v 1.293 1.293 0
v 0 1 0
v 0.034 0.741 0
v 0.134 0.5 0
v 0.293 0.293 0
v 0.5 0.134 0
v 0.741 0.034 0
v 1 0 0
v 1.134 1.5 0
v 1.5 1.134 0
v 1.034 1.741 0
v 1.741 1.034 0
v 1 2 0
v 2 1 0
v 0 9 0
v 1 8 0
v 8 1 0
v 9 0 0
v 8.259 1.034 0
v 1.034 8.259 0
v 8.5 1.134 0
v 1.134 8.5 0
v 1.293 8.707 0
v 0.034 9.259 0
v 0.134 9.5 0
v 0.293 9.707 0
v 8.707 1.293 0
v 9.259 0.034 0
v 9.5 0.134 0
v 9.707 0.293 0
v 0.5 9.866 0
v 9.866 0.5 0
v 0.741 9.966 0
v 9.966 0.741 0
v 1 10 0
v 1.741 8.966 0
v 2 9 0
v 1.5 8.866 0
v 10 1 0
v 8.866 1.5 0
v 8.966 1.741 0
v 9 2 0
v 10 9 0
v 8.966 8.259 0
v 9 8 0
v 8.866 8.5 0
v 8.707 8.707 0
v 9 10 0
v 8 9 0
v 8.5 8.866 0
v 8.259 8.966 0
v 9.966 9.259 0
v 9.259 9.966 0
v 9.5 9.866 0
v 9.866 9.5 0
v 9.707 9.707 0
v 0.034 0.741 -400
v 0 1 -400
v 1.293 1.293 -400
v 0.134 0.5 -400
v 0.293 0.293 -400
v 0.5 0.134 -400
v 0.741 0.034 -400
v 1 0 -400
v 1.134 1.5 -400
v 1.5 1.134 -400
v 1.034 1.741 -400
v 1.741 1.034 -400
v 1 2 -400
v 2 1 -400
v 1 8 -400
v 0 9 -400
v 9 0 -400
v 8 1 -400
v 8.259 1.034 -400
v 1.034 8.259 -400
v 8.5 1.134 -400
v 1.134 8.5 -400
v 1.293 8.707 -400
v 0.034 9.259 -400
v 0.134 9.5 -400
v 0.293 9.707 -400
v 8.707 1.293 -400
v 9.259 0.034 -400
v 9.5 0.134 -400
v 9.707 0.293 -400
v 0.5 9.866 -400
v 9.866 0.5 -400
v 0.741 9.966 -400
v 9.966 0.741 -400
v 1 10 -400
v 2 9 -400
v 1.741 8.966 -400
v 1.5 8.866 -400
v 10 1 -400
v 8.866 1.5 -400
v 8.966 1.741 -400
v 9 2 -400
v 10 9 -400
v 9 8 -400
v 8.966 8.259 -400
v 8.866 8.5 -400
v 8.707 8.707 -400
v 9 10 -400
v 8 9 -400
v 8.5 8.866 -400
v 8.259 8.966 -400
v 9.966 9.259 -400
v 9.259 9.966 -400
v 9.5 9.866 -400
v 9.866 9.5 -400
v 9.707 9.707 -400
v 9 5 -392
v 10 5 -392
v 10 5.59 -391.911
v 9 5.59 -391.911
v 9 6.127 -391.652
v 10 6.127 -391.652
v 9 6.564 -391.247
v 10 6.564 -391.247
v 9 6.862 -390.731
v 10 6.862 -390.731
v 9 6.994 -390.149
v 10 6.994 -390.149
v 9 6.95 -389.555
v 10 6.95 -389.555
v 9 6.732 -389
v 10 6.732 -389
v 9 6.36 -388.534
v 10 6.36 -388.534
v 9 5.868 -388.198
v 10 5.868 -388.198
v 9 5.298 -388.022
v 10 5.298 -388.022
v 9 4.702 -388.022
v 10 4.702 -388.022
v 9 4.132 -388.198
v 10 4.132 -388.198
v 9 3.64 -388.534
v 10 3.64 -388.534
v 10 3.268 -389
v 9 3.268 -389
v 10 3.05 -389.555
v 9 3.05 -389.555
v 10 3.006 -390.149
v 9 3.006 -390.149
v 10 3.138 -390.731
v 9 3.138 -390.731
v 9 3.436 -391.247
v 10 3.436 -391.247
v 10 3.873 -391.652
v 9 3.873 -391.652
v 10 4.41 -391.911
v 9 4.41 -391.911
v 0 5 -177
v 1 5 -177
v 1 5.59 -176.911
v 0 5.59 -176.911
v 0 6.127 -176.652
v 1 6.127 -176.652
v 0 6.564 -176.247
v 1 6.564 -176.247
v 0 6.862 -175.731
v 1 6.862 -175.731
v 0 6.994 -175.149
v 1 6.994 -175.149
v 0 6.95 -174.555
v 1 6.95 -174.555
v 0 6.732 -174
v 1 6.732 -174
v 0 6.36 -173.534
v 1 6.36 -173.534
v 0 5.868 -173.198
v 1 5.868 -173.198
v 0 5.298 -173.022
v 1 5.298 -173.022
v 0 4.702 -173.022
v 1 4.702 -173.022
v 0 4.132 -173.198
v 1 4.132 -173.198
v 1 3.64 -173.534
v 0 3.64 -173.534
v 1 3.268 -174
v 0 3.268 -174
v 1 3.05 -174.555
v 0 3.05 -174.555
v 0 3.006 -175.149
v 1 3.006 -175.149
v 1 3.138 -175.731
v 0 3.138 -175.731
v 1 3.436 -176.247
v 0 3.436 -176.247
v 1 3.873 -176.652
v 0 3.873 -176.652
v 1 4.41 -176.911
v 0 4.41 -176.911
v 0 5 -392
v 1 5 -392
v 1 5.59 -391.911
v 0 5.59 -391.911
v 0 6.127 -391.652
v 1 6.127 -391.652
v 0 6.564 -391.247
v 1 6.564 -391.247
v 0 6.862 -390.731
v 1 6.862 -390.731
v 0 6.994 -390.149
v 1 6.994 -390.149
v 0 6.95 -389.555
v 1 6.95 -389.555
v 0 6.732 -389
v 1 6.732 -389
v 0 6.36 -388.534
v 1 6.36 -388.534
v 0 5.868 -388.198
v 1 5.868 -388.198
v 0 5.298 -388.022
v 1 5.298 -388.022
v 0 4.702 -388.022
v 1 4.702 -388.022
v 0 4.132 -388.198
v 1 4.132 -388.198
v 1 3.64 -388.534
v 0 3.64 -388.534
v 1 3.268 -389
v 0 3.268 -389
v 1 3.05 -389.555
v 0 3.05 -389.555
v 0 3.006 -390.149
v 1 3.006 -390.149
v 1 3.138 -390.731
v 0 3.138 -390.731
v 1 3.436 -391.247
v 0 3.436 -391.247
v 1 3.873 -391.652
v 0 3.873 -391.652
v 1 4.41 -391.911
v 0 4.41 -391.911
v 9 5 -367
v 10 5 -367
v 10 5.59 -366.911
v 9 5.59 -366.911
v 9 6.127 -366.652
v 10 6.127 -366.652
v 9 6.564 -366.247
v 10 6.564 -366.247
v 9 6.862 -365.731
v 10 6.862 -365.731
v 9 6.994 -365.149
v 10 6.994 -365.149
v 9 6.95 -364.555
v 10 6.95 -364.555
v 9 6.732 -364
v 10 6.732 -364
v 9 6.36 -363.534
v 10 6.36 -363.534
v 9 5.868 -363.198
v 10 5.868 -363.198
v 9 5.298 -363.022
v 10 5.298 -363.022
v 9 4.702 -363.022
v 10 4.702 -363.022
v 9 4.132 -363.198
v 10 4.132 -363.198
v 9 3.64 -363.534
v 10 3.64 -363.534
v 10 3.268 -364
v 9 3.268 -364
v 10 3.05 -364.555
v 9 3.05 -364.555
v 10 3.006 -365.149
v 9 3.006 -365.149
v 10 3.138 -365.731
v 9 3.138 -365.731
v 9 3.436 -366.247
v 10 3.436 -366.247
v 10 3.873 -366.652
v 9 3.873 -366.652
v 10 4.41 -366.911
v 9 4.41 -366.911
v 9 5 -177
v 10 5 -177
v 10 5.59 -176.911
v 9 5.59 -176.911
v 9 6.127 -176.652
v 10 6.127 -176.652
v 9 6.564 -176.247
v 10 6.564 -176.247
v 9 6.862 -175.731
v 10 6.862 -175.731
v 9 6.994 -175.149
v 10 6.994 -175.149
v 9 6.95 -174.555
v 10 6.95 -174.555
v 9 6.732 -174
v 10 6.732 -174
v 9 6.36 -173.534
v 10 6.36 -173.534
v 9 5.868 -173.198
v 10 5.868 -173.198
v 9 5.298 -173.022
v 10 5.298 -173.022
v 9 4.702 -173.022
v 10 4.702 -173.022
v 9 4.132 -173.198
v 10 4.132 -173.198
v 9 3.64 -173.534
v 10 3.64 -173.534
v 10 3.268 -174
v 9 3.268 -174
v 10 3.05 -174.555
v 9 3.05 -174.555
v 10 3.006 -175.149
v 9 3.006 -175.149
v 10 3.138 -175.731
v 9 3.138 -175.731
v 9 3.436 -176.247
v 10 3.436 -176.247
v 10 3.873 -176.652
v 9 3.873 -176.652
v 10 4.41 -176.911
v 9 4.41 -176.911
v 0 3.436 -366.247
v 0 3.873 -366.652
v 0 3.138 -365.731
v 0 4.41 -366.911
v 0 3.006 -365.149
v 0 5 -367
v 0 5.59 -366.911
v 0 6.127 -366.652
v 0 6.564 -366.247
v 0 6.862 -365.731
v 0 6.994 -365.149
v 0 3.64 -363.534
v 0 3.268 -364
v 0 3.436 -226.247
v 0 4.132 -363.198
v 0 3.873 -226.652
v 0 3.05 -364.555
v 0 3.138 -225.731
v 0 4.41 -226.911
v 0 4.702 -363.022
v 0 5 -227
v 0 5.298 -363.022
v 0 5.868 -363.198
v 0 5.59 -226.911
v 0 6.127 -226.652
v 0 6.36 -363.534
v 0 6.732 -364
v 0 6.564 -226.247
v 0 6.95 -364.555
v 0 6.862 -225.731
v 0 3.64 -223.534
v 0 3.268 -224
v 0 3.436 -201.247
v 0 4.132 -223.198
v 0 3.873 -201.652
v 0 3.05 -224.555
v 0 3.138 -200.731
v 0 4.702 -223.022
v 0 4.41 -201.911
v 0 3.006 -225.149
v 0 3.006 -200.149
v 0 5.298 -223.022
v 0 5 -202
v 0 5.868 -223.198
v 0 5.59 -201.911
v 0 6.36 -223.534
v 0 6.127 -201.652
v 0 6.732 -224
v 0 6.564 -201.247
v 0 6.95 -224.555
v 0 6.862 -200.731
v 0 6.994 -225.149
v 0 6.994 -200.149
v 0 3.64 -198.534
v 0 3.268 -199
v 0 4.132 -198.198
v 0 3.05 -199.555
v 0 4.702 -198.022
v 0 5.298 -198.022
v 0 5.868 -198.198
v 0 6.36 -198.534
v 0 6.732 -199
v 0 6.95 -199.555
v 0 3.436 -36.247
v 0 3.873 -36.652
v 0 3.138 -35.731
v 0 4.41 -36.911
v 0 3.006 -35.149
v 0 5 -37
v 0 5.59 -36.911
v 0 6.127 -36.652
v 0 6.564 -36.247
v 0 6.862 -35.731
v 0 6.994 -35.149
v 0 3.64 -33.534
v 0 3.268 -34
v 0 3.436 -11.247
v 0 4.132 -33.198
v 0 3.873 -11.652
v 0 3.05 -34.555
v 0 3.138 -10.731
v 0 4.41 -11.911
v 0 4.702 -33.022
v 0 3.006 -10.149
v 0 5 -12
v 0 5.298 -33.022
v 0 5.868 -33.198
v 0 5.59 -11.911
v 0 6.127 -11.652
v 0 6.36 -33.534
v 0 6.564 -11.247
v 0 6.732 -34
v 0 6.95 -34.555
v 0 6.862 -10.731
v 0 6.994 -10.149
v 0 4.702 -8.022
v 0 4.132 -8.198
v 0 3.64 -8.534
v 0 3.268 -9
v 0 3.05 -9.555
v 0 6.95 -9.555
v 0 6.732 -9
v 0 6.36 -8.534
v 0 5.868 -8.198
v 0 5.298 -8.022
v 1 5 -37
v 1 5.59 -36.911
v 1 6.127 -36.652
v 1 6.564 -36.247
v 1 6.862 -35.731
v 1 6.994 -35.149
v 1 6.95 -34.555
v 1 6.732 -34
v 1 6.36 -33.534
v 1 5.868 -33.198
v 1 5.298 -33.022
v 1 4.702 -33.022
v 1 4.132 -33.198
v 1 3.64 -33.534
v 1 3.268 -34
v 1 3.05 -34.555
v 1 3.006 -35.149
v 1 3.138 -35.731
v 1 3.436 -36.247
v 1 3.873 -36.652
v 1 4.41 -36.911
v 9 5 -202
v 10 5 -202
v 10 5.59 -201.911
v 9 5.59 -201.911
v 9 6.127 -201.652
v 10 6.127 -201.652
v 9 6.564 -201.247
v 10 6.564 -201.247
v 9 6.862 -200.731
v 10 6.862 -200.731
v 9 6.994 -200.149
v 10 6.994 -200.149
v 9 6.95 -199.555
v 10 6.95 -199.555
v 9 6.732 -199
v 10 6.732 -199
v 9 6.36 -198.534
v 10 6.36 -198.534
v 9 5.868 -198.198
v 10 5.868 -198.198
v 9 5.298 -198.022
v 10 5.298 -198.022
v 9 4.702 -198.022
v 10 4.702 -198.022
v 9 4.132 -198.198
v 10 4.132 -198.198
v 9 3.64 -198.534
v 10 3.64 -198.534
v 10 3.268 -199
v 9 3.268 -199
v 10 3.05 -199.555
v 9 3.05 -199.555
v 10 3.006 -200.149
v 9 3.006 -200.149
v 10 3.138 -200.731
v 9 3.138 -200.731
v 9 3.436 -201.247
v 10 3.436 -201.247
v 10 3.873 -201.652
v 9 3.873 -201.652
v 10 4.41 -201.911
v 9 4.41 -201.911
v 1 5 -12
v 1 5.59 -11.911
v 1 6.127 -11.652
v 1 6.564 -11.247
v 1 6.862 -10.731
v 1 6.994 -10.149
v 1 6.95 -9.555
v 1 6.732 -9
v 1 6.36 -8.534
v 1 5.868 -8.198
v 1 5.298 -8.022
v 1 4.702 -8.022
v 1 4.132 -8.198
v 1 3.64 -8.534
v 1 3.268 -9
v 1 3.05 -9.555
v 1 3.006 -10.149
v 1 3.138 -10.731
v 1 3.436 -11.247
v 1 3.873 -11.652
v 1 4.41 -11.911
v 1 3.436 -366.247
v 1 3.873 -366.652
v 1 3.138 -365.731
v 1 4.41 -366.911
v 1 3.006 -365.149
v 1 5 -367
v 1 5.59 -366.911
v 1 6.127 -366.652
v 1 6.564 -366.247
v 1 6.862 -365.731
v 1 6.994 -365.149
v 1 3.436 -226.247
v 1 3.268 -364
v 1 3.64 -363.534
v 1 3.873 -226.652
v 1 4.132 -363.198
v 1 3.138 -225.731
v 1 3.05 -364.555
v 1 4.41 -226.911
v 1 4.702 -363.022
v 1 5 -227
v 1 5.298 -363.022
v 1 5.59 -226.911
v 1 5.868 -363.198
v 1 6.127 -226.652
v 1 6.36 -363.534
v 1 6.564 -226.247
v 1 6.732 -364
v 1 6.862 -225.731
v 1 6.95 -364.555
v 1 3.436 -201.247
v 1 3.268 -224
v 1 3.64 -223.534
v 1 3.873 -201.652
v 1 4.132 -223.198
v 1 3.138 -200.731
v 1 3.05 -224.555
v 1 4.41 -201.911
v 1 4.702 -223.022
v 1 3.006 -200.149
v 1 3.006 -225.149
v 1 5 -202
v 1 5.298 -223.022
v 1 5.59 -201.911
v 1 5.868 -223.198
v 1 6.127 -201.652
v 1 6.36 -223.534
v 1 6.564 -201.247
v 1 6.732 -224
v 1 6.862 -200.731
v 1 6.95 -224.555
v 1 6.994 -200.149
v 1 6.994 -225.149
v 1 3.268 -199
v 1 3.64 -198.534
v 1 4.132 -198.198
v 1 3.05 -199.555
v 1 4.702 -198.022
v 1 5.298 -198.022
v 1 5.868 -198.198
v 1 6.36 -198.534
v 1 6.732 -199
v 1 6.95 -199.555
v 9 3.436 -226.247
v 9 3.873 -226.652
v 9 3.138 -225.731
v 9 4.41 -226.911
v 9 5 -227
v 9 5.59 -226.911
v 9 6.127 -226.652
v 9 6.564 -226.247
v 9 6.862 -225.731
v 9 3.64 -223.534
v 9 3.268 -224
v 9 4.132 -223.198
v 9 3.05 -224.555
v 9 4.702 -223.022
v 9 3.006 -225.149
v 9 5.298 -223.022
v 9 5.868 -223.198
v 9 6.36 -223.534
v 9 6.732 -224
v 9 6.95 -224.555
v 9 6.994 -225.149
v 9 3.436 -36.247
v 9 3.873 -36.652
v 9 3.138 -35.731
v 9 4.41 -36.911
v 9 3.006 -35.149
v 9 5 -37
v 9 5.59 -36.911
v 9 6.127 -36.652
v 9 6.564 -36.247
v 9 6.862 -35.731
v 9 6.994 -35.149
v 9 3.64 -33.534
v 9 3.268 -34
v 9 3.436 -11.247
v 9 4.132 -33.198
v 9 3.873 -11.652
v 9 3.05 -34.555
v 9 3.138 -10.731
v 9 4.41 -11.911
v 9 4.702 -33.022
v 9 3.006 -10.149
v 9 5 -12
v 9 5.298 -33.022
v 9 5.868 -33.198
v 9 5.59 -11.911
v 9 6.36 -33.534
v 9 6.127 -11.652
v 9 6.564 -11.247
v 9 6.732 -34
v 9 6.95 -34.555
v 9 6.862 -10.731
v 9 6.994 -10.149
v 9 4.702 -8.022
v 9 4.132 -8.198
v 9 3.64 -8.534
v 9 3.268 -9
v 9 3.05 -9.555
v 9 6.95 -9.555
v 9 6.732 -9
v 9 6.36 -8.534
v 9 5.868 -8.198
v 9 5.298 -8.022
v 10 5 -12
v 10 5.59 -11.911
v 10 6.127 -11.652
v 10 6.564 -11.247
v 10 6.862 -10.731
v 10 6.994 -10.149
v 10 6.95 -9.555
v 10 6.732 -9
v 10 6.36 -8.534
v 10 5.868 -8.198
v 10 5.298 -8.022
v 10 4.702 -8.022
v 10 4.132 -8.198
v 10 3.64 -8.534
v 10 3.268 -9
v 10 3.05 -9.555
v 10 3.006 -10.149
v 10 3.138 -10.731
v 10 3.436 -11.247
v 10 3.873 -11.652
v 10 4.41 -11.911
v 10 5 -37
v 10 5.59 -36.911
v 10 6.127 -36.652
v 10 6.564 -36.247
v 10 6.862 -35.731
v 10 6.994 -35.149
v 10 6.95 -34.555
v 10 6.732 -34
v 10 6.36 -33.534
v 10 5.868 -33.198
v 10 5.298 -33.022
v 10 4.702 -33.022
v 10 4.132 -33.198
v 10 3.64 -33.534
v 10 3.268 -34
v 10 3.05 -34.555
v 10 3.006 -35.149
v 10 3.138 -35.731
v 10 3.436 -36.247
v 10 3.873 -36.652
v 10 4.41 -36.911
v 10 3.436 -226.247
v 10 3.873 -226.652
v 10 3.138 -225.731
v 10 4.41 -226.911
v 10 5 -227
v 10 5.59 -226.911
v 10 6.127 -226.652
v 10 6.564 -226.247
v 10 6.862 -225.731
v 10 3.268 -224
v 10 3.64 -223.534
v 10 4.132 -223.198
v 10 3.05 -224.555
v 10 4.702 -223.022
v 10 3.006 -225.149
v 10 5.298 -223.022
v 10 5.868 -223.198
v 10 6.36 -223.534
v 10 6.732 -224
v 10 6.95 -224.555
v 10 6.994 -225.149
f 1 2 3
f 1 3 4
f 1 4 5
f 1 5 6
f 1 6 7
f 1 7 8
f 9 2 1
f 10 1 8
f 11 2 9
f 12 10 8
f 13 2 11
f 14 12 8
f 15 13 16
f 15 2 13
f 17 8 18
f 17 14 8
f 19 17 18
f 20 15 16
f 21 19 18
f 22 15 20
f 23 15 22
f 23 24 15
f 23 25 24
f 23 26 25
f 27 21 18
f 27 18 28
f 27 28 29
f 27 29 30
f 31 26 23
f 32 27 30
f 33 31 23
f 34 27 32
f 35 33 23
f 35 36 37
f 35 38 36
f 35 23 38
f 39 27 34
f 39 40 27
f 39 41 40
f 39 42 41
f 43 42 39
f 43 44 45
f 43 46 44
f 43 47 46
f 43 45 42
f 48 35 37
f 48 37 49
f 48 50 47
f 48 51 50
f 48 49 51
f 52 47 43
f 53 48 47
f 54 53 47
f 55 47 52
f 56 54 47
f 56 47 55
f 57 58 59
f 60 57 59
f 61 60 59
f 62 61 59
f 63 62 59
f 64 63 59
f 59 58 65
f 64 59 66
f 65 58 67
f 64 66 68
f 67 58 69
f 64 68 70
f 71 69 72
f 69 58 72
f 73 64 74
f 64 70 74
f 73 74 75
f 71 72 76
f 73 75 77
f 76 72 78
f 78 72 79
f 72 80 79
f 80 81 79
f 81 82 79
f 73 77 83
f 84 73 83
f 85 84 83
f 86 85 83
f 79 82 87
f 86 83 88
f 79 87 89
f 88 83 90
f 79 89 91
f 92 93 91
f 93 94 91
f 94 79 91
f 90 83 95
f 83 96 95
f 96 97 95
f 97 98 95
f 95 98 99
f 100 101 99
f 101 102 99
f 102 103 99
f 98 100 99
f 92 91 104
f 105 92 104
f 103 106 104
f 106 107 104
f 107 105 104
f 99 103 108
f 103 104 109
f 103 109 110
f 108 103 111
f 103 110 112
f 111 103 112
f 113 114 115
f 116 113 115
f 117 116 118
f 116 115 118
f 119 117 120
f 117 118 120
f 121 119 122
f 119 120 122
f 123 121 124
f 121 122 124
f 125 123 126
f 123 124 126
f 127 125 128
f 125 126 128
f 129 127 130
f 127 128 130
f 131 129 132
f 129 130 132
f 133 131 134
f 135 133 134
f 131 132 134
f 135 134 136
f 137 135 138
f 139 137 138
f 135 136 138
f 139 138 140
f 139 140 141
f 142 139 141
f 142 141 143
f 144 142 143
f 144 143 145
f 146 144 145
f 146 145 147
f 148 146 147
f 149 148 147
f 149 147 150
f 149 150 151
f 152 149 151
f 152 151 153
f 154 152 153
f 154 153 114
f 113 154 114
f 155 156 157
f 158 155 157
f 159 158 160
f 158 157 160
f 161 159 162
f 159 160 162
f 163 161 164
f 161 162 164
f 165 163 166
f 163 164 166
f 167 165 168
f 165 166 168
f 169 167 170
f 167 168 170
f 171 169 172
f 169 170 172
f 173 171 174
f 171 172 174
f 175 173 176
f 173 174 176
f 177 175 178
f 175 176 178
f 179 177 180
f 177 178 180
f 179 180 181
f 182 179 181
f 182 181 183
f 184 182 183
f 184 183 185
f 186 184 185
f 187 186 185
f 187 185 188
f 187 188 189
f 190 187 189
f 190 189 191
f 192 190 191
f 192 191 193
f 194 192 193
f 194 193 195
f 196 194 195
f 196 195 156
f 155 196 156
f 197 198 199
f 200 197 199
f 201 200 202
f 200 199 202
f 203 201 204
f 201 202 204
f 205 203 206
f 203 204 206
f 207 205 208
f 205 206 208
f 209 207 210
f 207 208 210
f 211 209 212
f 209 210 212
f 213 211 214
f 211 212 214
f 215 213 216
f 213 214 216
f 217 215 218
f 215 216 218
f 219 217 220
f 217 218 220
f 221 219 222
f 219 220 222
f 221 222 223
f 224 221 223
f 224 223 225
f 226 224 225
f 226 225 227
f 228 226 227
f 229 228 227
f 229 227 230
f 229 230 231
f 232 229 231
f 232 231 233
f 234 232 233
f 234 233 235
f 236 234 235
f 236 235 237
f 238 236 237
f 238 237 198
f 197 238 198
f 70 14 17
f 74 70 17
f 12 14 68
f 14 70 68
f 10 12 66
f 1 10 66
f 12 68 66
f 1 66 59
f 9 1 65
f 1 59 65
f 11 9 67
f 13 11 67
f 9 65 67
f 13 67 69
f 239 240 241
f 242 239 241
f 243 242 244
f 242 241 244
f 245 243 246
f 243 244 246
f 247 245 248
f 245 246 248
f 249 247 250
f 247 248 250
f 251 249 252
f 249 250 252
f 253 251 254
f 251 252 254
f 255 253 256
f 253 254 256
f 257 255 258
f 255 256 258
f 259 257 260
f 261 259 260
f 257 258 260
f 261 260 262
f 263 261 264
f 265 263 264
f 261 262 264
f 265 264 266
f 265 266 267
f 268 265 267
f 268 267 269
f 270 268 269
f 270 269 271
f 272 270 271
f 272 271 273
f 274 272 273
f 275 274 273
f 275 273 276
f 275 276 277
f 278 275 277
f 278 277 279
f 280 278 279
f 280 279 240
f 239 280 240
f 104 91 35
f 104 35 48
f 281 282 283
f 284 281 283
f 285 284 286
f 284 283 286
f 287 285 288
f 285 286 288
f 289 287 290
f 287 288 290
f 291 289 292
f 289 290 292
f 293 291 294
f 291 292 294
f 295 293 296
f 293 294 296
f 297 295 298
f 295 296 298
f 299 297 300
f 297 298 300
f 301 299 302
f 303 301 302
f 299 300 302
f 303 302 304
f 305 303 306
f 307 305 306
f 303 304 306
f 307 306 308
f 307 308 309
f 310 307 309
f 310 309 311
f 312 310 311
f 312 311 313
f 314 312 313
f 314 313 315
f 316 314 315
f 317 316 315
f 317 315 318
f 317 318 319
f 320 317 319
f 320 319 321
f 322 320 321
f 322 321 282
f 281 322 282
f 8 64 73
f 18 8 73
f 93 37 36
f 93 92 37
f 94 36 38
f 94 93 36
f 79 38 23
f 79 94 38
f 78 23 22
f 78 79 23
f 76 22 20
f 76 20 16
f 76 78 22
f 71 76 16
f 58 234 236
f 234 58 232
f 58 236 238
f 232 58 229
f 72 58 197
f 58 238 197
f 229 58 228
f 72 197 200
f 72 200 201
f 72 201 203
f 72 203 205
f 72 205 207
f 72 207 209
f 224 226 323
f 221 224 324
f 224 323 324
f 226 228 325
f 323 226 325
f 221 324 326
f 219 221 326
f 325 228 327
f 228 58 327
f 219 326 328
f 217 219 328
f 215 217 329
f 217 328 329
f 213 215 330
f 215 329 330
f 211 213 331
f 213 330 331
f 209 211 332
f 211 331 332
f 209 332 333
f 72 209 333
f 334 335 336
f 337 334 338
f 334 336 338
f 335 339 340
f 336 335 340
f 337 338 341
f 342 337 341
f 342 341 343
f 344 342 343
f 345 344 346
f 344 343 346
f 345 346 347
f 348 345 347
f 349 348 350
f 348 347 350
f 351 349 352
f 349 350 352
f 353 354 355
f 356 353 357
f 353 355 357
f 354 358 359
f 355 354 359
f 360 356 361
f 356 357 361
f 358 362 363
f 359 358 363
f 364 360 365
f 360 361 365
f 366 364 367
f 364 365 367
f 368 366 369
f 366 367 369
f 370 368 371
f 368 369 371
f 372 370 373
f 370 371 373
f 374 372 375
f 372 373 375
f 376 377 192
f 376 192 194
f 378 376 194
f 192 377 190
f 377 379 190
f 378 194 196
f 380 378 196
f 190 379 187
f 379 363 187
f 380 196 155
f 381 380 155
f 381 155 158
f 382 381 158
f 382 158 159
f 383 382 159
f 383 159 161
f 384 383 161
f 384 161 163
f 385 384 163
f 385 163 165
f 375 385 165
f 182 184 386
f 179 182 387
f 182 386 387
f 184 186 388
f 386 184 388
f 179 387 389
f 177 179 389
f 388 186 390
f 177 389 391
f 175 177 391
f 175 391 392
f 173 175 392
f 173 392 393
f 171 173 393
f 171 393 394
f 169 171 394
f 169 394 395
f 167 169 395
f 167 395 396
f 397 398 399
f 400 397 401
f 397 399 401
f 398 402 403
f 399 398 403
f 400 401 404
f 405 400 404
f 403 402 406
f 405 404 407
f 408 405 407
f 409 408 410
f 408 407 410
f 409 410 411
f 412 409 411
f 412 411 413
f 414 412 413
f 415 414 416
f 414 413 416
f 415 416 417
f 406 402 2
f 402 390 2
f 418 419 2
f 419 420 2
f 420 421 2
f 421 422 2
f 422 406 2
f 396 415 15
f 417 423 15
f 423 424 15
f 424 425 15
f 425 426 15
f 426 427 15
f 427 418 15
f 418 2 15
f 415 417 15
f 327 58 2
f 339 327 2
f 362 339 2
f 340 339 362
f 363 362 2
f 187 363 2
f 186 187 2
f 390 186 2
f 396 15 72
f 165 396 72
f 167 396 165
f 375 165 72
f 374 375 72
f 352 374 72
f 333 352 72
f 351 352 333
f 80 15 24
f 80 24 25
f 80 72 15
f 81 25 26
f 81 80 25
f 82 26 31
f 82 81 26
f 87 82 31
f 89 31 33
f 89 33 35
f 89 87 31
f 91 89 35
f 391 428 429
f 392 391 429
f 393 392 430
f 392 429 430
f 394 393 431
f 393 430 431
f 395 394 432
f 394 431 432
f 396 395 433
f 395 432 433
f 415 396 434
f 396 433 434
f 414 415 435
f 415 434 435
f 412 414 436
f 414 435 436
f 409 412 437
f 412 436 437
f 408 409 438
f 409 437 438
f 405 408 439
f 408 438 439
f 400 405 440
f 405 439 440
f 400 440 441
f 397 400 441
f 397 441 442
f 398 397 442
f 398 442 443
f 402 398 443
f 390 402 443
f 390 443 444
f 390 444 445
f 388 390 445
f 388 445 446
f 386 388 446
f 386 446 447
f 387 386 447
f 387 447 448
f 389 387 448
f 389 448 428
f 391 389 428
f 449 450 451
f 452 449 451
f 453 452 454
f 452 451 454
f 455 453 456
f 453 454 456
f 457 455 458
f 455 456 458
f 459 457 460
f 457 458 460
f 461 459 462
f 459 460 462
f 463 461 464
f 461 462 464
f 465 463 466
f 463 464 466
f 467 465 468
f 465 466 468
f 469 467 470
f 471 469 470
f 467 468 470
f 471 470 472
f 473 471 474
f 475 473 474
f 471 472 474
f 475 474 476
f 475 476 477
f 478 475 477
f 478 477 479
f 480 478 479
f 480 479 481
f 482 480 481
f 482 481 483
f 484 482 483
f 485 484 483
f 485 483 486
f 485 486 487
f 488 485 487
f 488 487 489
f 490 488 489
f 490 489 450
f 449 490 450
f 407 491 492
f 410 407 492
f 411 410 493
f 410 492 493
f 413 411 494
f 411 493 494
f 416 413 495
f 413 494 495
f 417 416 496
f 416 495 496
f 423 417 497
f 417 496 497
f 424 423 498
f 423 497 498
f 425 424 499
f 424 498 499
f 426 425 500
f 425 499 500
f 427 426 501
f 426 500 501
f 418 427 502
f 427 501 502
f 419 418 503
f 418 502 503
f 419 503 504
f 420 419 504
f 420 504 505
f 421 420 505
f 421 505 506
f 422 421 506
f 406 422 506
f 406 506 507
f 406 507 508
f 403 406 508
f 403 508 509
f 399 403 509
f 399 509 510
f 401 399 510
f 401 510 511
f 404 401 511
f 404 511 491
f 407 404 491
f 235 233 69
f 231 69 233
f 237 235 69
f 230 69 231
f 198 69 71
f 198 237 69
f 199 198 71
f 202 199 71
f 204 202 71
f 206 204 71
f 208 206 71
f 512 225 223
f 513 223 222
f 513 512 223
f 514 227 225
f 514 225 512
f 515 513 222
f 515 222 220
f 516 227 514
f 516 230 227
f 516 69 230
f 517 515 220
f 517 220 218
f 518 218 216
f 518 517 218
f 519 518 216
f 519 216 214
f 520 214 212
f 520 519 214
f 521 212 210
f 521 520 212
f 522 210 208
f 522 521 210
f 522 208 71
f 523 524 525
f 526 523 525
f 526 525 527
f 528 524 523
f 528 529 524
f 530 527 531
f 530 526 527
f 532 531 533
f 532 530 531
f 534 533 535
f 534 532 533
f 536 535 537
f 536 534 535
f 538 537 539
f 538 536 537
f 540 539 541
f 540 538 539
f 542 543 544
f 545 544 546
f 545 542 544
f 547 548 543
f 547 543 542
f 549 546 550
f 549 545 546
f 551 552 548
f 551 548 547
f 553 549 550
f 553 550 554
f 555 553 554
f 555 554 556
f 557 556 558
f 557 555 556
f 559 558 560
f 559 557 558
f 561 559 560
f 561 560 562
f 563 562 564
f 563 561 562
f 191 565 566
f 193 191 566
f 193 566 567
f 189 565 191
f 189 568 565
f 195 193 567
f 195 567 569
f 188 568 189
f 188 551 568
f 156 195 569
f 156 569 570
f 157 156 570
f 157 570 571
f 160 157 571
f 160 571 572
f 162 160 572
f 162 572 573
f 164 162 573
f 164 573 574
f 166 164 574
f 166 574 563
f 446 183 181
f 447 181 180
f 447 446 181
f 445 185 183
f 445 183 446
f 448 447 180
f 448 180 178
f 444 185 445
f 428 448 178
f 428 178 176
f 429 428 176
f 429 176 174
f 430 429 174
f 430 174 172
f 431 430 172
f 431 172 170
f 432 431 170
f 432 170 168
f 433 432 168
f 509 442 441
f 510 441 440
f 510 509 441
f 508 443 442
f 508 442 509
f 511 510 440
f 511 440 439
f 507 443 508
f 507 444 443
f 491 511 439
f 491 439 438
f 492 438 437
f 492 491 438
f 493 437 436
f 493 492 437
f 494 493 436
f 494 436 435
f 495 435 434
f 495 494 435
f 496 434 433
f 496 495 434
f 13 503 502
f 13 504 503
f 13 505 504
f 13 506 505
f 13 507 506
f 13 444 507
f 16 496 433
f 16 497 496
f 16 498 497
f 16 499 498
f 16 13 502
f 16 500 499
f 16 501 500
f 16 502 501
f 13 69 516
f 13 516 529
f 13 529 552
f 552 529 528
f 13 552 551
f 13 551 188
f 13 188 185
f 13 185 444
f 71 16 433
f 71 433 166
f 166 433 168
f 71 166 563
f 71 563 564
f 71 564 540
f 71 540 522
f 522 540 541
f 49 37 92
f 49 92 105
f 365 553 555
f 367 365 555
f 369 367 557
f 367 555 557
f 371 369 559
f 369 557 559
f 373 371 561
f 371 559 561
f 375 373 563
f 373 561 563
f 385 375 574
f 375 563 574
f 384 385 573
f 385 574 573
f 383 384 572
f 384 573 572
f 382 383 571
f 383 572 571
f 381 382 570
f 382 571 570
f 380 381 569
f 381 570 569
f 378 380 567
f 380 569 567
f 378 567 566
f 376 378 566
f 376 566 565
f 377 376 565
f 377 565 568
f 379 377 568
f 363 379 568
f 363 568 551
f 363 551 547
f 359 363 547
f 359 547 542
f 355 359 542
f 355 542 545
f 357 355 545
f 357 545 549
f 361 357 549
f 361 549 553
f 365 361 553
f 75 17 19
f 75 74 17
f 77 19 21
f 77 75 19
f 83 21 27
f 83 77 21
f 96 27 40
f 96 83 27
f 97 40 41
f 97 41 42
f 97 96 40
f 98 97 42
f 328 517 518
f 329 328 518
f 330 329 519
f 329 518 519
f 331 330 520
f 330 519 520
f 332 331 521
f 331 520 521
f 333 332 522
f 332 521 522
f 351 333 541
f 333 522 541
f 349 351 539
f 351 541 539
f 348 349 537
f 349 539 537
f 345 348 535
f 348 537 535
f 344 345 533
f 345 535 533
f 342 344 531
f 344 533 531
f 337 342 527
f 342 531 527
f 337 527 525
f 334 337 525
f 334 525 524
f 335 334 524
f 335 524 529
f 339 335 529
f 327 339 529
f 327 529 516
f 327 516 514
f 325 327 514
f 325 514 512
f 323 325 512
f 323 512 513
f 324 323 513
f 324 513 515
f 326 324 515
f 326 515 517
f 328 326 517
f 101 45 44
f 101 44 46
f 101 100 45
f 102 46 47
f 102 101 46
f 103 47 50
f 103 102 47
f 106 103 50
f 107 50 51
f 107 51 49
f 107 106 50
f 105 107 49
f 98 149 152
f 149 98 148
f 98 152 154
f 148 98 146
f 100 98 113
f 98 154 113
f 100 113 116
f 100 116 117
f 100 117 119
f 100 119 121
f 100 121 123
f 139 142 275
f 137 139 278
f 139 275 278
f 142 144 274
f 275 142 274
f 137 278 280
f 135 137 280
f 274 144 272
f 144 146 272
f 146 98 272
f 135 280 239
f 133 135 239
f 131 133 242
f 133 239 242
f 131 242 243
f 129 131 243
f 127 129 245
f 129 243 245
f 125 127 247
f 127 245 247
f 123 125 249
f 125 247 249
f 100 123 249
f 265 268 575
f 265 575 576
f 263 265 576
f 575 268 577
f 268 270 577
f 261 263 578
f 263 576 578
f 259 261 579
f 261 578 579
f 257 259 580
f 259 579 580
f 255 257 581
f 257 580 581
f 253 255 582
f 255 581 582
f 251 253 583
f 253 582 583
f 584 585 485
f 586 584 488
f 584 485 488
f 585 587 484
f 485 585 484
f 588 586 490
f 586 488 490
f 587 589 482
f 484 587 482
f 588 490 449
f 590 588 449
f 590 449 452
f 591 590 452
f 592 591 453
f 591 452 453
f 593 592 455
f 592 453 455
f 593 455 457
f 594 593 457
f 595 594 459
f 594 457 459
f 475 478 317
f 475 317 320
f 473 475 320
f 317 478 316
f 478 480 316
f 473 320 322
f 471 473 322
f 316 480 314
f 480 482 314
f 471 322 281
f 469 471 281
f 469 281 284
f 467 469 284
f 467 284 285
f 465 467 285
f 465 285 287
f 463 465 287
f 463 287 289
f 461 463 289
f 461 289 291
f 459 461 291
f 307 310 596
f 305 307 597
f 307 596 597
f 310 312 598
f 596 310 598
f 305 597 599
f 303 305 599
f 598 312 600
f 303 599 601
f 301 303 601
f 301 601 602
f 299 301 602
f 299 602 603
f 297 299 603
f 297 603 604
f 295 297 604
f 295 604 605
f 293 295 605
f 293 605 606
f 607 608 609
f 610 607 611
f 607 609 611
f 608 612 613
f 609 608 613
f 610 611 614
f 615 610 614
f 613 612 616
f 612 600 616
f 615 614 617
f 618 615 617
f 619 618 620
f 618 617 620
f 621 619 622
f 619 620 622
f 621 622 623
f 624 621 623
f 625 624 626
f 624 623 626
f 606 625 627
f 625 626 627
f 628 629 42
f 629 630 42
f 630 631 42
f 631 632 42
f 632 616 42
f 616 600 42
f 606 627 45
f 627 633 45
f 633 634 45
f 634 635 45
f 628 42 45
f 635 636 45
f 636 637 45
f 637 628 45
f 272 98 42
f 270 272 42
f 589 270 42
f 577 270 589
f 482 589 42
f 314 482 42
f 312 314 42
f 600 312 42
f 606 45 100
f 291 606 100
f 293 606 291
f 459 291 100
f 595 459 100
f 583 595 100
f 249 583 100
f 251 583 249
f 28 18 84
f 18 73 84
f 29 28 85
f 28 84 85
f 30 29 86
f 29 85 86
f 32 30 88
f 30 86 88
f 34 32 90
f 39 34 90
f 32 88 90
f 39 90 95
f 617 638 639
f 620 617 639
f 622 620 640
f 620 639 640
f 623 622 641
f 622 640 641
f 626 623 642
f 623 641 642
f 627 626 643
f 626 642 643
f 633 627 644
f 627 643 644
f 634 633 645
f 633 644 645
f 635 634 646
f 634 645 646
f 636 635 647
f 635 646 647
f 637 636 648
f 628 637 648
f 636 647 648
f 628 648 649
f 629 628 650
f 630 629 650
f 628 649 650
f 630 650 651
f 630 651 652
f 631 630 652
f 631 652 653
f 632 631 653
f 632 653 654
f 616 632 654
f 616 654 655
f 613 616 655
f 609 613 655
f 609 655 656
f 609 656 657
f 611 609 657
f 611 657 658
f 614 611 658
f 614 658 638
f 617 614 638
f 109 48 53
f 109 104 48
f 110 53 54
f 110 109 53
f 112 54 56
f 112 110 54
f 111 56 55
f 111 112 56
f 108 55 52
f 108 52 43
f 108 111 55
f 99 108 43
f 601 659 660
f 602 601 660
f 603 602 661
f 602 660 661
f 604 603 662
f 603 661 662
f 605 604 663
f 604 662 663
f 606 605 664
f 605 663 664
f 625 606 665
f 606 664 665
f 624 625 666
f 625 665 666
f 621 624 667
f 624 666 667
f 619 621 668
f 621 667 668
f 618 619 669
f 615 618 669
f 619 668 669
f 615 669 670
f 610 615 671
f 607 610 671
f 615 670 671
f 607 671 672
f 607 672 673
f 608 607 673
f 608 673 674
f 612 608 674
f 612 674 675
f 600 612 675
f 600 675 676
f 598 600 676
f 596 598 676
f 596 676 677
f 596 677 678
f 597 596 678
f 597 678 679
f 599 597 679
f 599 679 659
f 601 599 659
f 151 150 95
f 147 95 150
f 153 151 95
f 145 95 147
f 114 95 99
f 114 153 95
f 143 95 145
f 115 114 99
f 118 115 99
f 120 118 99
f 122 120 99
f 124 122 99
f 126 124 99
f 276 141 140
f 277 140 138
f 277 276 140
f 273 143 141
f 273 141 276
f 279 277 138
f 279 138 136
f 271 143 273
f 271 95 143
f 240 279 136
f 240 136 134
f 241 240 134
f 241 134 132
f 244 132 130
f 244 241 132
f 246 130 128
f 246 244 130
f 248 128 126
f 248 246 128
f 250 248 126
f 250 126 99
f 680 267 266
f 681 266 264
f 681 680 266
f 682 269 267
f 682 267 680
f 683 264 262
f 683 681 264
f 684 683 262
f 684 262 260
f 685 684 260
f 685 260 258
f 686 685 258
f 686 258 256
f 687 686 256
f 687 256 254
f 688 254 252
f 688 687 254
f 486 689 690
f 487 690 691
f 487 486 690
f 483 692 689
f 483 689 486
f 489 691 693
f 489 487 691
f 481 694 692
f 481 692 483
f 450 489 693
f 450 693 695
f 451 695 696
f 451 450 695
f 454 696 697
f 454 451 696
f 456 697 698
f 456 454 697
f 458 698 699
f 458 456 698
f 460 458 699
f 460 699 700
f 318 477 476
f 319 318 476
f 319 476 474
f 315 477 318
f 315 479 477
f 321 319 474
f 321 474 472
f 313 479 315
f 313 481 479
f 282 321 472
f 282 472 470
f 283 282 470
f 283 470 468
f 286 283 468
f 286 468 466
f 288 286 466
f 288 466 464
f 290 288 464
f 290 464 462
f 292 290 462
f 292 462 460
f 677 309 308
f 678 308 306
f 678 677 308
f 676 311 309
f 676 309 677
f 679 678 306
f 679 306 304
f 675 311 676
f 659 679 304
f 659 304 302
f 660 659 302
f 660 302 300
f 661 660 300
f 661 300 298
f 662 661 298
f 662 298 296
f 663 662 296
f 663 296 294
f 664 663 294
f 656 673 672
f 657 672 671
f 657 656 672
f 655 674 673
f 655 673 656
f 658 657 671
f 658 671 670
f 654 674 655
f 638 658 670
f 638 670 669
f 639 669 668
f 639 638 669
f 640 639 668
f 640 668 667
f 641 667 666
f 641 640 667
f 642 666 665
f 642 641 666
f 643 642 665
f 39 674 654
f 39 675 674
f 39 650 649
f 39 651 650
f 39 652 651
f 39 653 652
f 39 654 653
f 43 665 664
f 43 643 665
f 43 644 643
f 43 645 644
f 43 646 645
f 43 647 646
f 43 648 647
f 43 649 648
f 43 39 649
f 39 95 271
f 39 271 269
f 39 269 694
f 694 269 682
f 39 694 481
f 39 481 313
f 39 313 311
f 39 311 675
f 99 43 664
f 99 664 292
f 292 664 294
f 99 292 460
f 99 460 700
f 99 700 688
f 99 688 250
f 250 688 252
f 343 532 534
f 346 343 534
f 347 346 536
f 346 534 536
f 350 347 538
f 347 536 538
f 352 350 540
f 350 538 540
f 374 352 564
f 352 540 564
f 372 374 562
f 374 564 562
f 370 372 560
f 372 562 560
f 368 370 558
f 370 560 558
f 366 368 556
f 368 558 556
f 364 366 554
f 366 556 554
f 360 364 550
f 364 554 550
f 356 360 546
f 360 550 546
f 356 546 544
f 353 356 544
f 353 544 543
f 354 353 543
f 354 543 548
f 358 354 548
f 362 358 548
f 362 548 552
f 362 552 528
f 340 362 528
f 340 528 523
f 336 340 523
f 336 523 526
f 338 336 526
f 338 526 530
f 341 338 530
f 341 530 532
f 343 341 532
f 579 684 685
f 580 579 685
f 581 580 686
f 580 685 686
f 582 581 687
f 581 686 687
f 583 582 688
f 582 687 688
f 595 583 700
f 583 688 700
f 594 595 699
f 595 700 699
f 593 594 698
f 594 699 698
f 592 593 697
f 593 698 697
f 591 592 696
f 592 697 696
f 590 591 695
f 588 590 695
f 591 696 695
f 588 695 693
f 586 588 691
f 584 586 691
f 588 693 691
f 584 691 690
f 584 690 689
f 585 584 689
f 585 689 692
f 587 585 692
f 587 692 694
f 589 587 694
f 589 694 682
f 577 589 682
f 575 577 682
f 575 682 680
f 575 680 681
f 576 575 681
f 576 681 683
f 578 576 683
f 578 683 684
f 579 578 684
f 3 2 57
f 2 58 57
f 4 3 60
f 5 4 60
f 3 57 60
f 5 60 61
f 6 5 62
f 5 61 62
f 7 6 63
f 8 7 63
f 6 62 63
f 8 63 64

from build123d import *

# Parameters (mm, degrees)
SKETCH1_W           = 10
SKETCH1_H           = 10
SKETCH1_W_2         = 8
SKETCH1_H_2         = 8
BOSS_EXTRUDE1_DEPTH = 400
FILLET1_R           = 1
SKETCH2_R           = 2
CUT_EXTRUDE1_DEPTH  = 27


with BuildPart() as part:
    # Sketch1 → Boss-Extrude1 (new body)
    with BuildSketch(Plane.XY):
        with Locations((5, 5)):
            Rectangle(SKETCH1_W, SKETCH1_H)
        with Locations((5, 5)):
            Rectangle(SKETCH1_W_2, SKETCH1_H_2, mode=Mode.SUBTRACT)
    extrude(amount=-BOSS_EXTRUDE1_DEPTH)

    # Fillet1
    fillet1_edges = [part.edges().sort_by_distance(p)[0] for p in [
        (1, 1, -200),
        (1, 9, -200),
        (9, 9, -200),
        (9, 1, -200),
        (0, 10, -200),
        (10, 10, -200),
        (10, 0, -200),
        (0, 0, -200),
    ]]
    fillet(fillet1_edges, radius=FILLET1_R)

    # Sketch2 → Cut-Extrude1 (cut)
    with BuildSketch(Plane(origin=(10, 0, 0), x_dir=(0, 0, -1), z_dir=(1, 0, 0))):
        with Locations((200, 5)):
            Circle(SKETCH2_R)
        with Locations((225, 5)):
            Circle(SKETCH2_R)
        with Locations((175, 5)):
            Circle(SKETCH2_R)
        with Locations((10, 5)):
            Circle(SKETCH2_R)
        with Locations((35, 5)):
            Circle(SKETCH2_R)
        with Locations((390, 5)):
            Circle(SKETCH2_R)
        with Locations((365, 5)):
            Circle(SKETCH2_R)
    extrude(amount=-CUT_EXTRUDE1_DEPTH, mode=Mode.SUBTRACT)


solid = part.part
